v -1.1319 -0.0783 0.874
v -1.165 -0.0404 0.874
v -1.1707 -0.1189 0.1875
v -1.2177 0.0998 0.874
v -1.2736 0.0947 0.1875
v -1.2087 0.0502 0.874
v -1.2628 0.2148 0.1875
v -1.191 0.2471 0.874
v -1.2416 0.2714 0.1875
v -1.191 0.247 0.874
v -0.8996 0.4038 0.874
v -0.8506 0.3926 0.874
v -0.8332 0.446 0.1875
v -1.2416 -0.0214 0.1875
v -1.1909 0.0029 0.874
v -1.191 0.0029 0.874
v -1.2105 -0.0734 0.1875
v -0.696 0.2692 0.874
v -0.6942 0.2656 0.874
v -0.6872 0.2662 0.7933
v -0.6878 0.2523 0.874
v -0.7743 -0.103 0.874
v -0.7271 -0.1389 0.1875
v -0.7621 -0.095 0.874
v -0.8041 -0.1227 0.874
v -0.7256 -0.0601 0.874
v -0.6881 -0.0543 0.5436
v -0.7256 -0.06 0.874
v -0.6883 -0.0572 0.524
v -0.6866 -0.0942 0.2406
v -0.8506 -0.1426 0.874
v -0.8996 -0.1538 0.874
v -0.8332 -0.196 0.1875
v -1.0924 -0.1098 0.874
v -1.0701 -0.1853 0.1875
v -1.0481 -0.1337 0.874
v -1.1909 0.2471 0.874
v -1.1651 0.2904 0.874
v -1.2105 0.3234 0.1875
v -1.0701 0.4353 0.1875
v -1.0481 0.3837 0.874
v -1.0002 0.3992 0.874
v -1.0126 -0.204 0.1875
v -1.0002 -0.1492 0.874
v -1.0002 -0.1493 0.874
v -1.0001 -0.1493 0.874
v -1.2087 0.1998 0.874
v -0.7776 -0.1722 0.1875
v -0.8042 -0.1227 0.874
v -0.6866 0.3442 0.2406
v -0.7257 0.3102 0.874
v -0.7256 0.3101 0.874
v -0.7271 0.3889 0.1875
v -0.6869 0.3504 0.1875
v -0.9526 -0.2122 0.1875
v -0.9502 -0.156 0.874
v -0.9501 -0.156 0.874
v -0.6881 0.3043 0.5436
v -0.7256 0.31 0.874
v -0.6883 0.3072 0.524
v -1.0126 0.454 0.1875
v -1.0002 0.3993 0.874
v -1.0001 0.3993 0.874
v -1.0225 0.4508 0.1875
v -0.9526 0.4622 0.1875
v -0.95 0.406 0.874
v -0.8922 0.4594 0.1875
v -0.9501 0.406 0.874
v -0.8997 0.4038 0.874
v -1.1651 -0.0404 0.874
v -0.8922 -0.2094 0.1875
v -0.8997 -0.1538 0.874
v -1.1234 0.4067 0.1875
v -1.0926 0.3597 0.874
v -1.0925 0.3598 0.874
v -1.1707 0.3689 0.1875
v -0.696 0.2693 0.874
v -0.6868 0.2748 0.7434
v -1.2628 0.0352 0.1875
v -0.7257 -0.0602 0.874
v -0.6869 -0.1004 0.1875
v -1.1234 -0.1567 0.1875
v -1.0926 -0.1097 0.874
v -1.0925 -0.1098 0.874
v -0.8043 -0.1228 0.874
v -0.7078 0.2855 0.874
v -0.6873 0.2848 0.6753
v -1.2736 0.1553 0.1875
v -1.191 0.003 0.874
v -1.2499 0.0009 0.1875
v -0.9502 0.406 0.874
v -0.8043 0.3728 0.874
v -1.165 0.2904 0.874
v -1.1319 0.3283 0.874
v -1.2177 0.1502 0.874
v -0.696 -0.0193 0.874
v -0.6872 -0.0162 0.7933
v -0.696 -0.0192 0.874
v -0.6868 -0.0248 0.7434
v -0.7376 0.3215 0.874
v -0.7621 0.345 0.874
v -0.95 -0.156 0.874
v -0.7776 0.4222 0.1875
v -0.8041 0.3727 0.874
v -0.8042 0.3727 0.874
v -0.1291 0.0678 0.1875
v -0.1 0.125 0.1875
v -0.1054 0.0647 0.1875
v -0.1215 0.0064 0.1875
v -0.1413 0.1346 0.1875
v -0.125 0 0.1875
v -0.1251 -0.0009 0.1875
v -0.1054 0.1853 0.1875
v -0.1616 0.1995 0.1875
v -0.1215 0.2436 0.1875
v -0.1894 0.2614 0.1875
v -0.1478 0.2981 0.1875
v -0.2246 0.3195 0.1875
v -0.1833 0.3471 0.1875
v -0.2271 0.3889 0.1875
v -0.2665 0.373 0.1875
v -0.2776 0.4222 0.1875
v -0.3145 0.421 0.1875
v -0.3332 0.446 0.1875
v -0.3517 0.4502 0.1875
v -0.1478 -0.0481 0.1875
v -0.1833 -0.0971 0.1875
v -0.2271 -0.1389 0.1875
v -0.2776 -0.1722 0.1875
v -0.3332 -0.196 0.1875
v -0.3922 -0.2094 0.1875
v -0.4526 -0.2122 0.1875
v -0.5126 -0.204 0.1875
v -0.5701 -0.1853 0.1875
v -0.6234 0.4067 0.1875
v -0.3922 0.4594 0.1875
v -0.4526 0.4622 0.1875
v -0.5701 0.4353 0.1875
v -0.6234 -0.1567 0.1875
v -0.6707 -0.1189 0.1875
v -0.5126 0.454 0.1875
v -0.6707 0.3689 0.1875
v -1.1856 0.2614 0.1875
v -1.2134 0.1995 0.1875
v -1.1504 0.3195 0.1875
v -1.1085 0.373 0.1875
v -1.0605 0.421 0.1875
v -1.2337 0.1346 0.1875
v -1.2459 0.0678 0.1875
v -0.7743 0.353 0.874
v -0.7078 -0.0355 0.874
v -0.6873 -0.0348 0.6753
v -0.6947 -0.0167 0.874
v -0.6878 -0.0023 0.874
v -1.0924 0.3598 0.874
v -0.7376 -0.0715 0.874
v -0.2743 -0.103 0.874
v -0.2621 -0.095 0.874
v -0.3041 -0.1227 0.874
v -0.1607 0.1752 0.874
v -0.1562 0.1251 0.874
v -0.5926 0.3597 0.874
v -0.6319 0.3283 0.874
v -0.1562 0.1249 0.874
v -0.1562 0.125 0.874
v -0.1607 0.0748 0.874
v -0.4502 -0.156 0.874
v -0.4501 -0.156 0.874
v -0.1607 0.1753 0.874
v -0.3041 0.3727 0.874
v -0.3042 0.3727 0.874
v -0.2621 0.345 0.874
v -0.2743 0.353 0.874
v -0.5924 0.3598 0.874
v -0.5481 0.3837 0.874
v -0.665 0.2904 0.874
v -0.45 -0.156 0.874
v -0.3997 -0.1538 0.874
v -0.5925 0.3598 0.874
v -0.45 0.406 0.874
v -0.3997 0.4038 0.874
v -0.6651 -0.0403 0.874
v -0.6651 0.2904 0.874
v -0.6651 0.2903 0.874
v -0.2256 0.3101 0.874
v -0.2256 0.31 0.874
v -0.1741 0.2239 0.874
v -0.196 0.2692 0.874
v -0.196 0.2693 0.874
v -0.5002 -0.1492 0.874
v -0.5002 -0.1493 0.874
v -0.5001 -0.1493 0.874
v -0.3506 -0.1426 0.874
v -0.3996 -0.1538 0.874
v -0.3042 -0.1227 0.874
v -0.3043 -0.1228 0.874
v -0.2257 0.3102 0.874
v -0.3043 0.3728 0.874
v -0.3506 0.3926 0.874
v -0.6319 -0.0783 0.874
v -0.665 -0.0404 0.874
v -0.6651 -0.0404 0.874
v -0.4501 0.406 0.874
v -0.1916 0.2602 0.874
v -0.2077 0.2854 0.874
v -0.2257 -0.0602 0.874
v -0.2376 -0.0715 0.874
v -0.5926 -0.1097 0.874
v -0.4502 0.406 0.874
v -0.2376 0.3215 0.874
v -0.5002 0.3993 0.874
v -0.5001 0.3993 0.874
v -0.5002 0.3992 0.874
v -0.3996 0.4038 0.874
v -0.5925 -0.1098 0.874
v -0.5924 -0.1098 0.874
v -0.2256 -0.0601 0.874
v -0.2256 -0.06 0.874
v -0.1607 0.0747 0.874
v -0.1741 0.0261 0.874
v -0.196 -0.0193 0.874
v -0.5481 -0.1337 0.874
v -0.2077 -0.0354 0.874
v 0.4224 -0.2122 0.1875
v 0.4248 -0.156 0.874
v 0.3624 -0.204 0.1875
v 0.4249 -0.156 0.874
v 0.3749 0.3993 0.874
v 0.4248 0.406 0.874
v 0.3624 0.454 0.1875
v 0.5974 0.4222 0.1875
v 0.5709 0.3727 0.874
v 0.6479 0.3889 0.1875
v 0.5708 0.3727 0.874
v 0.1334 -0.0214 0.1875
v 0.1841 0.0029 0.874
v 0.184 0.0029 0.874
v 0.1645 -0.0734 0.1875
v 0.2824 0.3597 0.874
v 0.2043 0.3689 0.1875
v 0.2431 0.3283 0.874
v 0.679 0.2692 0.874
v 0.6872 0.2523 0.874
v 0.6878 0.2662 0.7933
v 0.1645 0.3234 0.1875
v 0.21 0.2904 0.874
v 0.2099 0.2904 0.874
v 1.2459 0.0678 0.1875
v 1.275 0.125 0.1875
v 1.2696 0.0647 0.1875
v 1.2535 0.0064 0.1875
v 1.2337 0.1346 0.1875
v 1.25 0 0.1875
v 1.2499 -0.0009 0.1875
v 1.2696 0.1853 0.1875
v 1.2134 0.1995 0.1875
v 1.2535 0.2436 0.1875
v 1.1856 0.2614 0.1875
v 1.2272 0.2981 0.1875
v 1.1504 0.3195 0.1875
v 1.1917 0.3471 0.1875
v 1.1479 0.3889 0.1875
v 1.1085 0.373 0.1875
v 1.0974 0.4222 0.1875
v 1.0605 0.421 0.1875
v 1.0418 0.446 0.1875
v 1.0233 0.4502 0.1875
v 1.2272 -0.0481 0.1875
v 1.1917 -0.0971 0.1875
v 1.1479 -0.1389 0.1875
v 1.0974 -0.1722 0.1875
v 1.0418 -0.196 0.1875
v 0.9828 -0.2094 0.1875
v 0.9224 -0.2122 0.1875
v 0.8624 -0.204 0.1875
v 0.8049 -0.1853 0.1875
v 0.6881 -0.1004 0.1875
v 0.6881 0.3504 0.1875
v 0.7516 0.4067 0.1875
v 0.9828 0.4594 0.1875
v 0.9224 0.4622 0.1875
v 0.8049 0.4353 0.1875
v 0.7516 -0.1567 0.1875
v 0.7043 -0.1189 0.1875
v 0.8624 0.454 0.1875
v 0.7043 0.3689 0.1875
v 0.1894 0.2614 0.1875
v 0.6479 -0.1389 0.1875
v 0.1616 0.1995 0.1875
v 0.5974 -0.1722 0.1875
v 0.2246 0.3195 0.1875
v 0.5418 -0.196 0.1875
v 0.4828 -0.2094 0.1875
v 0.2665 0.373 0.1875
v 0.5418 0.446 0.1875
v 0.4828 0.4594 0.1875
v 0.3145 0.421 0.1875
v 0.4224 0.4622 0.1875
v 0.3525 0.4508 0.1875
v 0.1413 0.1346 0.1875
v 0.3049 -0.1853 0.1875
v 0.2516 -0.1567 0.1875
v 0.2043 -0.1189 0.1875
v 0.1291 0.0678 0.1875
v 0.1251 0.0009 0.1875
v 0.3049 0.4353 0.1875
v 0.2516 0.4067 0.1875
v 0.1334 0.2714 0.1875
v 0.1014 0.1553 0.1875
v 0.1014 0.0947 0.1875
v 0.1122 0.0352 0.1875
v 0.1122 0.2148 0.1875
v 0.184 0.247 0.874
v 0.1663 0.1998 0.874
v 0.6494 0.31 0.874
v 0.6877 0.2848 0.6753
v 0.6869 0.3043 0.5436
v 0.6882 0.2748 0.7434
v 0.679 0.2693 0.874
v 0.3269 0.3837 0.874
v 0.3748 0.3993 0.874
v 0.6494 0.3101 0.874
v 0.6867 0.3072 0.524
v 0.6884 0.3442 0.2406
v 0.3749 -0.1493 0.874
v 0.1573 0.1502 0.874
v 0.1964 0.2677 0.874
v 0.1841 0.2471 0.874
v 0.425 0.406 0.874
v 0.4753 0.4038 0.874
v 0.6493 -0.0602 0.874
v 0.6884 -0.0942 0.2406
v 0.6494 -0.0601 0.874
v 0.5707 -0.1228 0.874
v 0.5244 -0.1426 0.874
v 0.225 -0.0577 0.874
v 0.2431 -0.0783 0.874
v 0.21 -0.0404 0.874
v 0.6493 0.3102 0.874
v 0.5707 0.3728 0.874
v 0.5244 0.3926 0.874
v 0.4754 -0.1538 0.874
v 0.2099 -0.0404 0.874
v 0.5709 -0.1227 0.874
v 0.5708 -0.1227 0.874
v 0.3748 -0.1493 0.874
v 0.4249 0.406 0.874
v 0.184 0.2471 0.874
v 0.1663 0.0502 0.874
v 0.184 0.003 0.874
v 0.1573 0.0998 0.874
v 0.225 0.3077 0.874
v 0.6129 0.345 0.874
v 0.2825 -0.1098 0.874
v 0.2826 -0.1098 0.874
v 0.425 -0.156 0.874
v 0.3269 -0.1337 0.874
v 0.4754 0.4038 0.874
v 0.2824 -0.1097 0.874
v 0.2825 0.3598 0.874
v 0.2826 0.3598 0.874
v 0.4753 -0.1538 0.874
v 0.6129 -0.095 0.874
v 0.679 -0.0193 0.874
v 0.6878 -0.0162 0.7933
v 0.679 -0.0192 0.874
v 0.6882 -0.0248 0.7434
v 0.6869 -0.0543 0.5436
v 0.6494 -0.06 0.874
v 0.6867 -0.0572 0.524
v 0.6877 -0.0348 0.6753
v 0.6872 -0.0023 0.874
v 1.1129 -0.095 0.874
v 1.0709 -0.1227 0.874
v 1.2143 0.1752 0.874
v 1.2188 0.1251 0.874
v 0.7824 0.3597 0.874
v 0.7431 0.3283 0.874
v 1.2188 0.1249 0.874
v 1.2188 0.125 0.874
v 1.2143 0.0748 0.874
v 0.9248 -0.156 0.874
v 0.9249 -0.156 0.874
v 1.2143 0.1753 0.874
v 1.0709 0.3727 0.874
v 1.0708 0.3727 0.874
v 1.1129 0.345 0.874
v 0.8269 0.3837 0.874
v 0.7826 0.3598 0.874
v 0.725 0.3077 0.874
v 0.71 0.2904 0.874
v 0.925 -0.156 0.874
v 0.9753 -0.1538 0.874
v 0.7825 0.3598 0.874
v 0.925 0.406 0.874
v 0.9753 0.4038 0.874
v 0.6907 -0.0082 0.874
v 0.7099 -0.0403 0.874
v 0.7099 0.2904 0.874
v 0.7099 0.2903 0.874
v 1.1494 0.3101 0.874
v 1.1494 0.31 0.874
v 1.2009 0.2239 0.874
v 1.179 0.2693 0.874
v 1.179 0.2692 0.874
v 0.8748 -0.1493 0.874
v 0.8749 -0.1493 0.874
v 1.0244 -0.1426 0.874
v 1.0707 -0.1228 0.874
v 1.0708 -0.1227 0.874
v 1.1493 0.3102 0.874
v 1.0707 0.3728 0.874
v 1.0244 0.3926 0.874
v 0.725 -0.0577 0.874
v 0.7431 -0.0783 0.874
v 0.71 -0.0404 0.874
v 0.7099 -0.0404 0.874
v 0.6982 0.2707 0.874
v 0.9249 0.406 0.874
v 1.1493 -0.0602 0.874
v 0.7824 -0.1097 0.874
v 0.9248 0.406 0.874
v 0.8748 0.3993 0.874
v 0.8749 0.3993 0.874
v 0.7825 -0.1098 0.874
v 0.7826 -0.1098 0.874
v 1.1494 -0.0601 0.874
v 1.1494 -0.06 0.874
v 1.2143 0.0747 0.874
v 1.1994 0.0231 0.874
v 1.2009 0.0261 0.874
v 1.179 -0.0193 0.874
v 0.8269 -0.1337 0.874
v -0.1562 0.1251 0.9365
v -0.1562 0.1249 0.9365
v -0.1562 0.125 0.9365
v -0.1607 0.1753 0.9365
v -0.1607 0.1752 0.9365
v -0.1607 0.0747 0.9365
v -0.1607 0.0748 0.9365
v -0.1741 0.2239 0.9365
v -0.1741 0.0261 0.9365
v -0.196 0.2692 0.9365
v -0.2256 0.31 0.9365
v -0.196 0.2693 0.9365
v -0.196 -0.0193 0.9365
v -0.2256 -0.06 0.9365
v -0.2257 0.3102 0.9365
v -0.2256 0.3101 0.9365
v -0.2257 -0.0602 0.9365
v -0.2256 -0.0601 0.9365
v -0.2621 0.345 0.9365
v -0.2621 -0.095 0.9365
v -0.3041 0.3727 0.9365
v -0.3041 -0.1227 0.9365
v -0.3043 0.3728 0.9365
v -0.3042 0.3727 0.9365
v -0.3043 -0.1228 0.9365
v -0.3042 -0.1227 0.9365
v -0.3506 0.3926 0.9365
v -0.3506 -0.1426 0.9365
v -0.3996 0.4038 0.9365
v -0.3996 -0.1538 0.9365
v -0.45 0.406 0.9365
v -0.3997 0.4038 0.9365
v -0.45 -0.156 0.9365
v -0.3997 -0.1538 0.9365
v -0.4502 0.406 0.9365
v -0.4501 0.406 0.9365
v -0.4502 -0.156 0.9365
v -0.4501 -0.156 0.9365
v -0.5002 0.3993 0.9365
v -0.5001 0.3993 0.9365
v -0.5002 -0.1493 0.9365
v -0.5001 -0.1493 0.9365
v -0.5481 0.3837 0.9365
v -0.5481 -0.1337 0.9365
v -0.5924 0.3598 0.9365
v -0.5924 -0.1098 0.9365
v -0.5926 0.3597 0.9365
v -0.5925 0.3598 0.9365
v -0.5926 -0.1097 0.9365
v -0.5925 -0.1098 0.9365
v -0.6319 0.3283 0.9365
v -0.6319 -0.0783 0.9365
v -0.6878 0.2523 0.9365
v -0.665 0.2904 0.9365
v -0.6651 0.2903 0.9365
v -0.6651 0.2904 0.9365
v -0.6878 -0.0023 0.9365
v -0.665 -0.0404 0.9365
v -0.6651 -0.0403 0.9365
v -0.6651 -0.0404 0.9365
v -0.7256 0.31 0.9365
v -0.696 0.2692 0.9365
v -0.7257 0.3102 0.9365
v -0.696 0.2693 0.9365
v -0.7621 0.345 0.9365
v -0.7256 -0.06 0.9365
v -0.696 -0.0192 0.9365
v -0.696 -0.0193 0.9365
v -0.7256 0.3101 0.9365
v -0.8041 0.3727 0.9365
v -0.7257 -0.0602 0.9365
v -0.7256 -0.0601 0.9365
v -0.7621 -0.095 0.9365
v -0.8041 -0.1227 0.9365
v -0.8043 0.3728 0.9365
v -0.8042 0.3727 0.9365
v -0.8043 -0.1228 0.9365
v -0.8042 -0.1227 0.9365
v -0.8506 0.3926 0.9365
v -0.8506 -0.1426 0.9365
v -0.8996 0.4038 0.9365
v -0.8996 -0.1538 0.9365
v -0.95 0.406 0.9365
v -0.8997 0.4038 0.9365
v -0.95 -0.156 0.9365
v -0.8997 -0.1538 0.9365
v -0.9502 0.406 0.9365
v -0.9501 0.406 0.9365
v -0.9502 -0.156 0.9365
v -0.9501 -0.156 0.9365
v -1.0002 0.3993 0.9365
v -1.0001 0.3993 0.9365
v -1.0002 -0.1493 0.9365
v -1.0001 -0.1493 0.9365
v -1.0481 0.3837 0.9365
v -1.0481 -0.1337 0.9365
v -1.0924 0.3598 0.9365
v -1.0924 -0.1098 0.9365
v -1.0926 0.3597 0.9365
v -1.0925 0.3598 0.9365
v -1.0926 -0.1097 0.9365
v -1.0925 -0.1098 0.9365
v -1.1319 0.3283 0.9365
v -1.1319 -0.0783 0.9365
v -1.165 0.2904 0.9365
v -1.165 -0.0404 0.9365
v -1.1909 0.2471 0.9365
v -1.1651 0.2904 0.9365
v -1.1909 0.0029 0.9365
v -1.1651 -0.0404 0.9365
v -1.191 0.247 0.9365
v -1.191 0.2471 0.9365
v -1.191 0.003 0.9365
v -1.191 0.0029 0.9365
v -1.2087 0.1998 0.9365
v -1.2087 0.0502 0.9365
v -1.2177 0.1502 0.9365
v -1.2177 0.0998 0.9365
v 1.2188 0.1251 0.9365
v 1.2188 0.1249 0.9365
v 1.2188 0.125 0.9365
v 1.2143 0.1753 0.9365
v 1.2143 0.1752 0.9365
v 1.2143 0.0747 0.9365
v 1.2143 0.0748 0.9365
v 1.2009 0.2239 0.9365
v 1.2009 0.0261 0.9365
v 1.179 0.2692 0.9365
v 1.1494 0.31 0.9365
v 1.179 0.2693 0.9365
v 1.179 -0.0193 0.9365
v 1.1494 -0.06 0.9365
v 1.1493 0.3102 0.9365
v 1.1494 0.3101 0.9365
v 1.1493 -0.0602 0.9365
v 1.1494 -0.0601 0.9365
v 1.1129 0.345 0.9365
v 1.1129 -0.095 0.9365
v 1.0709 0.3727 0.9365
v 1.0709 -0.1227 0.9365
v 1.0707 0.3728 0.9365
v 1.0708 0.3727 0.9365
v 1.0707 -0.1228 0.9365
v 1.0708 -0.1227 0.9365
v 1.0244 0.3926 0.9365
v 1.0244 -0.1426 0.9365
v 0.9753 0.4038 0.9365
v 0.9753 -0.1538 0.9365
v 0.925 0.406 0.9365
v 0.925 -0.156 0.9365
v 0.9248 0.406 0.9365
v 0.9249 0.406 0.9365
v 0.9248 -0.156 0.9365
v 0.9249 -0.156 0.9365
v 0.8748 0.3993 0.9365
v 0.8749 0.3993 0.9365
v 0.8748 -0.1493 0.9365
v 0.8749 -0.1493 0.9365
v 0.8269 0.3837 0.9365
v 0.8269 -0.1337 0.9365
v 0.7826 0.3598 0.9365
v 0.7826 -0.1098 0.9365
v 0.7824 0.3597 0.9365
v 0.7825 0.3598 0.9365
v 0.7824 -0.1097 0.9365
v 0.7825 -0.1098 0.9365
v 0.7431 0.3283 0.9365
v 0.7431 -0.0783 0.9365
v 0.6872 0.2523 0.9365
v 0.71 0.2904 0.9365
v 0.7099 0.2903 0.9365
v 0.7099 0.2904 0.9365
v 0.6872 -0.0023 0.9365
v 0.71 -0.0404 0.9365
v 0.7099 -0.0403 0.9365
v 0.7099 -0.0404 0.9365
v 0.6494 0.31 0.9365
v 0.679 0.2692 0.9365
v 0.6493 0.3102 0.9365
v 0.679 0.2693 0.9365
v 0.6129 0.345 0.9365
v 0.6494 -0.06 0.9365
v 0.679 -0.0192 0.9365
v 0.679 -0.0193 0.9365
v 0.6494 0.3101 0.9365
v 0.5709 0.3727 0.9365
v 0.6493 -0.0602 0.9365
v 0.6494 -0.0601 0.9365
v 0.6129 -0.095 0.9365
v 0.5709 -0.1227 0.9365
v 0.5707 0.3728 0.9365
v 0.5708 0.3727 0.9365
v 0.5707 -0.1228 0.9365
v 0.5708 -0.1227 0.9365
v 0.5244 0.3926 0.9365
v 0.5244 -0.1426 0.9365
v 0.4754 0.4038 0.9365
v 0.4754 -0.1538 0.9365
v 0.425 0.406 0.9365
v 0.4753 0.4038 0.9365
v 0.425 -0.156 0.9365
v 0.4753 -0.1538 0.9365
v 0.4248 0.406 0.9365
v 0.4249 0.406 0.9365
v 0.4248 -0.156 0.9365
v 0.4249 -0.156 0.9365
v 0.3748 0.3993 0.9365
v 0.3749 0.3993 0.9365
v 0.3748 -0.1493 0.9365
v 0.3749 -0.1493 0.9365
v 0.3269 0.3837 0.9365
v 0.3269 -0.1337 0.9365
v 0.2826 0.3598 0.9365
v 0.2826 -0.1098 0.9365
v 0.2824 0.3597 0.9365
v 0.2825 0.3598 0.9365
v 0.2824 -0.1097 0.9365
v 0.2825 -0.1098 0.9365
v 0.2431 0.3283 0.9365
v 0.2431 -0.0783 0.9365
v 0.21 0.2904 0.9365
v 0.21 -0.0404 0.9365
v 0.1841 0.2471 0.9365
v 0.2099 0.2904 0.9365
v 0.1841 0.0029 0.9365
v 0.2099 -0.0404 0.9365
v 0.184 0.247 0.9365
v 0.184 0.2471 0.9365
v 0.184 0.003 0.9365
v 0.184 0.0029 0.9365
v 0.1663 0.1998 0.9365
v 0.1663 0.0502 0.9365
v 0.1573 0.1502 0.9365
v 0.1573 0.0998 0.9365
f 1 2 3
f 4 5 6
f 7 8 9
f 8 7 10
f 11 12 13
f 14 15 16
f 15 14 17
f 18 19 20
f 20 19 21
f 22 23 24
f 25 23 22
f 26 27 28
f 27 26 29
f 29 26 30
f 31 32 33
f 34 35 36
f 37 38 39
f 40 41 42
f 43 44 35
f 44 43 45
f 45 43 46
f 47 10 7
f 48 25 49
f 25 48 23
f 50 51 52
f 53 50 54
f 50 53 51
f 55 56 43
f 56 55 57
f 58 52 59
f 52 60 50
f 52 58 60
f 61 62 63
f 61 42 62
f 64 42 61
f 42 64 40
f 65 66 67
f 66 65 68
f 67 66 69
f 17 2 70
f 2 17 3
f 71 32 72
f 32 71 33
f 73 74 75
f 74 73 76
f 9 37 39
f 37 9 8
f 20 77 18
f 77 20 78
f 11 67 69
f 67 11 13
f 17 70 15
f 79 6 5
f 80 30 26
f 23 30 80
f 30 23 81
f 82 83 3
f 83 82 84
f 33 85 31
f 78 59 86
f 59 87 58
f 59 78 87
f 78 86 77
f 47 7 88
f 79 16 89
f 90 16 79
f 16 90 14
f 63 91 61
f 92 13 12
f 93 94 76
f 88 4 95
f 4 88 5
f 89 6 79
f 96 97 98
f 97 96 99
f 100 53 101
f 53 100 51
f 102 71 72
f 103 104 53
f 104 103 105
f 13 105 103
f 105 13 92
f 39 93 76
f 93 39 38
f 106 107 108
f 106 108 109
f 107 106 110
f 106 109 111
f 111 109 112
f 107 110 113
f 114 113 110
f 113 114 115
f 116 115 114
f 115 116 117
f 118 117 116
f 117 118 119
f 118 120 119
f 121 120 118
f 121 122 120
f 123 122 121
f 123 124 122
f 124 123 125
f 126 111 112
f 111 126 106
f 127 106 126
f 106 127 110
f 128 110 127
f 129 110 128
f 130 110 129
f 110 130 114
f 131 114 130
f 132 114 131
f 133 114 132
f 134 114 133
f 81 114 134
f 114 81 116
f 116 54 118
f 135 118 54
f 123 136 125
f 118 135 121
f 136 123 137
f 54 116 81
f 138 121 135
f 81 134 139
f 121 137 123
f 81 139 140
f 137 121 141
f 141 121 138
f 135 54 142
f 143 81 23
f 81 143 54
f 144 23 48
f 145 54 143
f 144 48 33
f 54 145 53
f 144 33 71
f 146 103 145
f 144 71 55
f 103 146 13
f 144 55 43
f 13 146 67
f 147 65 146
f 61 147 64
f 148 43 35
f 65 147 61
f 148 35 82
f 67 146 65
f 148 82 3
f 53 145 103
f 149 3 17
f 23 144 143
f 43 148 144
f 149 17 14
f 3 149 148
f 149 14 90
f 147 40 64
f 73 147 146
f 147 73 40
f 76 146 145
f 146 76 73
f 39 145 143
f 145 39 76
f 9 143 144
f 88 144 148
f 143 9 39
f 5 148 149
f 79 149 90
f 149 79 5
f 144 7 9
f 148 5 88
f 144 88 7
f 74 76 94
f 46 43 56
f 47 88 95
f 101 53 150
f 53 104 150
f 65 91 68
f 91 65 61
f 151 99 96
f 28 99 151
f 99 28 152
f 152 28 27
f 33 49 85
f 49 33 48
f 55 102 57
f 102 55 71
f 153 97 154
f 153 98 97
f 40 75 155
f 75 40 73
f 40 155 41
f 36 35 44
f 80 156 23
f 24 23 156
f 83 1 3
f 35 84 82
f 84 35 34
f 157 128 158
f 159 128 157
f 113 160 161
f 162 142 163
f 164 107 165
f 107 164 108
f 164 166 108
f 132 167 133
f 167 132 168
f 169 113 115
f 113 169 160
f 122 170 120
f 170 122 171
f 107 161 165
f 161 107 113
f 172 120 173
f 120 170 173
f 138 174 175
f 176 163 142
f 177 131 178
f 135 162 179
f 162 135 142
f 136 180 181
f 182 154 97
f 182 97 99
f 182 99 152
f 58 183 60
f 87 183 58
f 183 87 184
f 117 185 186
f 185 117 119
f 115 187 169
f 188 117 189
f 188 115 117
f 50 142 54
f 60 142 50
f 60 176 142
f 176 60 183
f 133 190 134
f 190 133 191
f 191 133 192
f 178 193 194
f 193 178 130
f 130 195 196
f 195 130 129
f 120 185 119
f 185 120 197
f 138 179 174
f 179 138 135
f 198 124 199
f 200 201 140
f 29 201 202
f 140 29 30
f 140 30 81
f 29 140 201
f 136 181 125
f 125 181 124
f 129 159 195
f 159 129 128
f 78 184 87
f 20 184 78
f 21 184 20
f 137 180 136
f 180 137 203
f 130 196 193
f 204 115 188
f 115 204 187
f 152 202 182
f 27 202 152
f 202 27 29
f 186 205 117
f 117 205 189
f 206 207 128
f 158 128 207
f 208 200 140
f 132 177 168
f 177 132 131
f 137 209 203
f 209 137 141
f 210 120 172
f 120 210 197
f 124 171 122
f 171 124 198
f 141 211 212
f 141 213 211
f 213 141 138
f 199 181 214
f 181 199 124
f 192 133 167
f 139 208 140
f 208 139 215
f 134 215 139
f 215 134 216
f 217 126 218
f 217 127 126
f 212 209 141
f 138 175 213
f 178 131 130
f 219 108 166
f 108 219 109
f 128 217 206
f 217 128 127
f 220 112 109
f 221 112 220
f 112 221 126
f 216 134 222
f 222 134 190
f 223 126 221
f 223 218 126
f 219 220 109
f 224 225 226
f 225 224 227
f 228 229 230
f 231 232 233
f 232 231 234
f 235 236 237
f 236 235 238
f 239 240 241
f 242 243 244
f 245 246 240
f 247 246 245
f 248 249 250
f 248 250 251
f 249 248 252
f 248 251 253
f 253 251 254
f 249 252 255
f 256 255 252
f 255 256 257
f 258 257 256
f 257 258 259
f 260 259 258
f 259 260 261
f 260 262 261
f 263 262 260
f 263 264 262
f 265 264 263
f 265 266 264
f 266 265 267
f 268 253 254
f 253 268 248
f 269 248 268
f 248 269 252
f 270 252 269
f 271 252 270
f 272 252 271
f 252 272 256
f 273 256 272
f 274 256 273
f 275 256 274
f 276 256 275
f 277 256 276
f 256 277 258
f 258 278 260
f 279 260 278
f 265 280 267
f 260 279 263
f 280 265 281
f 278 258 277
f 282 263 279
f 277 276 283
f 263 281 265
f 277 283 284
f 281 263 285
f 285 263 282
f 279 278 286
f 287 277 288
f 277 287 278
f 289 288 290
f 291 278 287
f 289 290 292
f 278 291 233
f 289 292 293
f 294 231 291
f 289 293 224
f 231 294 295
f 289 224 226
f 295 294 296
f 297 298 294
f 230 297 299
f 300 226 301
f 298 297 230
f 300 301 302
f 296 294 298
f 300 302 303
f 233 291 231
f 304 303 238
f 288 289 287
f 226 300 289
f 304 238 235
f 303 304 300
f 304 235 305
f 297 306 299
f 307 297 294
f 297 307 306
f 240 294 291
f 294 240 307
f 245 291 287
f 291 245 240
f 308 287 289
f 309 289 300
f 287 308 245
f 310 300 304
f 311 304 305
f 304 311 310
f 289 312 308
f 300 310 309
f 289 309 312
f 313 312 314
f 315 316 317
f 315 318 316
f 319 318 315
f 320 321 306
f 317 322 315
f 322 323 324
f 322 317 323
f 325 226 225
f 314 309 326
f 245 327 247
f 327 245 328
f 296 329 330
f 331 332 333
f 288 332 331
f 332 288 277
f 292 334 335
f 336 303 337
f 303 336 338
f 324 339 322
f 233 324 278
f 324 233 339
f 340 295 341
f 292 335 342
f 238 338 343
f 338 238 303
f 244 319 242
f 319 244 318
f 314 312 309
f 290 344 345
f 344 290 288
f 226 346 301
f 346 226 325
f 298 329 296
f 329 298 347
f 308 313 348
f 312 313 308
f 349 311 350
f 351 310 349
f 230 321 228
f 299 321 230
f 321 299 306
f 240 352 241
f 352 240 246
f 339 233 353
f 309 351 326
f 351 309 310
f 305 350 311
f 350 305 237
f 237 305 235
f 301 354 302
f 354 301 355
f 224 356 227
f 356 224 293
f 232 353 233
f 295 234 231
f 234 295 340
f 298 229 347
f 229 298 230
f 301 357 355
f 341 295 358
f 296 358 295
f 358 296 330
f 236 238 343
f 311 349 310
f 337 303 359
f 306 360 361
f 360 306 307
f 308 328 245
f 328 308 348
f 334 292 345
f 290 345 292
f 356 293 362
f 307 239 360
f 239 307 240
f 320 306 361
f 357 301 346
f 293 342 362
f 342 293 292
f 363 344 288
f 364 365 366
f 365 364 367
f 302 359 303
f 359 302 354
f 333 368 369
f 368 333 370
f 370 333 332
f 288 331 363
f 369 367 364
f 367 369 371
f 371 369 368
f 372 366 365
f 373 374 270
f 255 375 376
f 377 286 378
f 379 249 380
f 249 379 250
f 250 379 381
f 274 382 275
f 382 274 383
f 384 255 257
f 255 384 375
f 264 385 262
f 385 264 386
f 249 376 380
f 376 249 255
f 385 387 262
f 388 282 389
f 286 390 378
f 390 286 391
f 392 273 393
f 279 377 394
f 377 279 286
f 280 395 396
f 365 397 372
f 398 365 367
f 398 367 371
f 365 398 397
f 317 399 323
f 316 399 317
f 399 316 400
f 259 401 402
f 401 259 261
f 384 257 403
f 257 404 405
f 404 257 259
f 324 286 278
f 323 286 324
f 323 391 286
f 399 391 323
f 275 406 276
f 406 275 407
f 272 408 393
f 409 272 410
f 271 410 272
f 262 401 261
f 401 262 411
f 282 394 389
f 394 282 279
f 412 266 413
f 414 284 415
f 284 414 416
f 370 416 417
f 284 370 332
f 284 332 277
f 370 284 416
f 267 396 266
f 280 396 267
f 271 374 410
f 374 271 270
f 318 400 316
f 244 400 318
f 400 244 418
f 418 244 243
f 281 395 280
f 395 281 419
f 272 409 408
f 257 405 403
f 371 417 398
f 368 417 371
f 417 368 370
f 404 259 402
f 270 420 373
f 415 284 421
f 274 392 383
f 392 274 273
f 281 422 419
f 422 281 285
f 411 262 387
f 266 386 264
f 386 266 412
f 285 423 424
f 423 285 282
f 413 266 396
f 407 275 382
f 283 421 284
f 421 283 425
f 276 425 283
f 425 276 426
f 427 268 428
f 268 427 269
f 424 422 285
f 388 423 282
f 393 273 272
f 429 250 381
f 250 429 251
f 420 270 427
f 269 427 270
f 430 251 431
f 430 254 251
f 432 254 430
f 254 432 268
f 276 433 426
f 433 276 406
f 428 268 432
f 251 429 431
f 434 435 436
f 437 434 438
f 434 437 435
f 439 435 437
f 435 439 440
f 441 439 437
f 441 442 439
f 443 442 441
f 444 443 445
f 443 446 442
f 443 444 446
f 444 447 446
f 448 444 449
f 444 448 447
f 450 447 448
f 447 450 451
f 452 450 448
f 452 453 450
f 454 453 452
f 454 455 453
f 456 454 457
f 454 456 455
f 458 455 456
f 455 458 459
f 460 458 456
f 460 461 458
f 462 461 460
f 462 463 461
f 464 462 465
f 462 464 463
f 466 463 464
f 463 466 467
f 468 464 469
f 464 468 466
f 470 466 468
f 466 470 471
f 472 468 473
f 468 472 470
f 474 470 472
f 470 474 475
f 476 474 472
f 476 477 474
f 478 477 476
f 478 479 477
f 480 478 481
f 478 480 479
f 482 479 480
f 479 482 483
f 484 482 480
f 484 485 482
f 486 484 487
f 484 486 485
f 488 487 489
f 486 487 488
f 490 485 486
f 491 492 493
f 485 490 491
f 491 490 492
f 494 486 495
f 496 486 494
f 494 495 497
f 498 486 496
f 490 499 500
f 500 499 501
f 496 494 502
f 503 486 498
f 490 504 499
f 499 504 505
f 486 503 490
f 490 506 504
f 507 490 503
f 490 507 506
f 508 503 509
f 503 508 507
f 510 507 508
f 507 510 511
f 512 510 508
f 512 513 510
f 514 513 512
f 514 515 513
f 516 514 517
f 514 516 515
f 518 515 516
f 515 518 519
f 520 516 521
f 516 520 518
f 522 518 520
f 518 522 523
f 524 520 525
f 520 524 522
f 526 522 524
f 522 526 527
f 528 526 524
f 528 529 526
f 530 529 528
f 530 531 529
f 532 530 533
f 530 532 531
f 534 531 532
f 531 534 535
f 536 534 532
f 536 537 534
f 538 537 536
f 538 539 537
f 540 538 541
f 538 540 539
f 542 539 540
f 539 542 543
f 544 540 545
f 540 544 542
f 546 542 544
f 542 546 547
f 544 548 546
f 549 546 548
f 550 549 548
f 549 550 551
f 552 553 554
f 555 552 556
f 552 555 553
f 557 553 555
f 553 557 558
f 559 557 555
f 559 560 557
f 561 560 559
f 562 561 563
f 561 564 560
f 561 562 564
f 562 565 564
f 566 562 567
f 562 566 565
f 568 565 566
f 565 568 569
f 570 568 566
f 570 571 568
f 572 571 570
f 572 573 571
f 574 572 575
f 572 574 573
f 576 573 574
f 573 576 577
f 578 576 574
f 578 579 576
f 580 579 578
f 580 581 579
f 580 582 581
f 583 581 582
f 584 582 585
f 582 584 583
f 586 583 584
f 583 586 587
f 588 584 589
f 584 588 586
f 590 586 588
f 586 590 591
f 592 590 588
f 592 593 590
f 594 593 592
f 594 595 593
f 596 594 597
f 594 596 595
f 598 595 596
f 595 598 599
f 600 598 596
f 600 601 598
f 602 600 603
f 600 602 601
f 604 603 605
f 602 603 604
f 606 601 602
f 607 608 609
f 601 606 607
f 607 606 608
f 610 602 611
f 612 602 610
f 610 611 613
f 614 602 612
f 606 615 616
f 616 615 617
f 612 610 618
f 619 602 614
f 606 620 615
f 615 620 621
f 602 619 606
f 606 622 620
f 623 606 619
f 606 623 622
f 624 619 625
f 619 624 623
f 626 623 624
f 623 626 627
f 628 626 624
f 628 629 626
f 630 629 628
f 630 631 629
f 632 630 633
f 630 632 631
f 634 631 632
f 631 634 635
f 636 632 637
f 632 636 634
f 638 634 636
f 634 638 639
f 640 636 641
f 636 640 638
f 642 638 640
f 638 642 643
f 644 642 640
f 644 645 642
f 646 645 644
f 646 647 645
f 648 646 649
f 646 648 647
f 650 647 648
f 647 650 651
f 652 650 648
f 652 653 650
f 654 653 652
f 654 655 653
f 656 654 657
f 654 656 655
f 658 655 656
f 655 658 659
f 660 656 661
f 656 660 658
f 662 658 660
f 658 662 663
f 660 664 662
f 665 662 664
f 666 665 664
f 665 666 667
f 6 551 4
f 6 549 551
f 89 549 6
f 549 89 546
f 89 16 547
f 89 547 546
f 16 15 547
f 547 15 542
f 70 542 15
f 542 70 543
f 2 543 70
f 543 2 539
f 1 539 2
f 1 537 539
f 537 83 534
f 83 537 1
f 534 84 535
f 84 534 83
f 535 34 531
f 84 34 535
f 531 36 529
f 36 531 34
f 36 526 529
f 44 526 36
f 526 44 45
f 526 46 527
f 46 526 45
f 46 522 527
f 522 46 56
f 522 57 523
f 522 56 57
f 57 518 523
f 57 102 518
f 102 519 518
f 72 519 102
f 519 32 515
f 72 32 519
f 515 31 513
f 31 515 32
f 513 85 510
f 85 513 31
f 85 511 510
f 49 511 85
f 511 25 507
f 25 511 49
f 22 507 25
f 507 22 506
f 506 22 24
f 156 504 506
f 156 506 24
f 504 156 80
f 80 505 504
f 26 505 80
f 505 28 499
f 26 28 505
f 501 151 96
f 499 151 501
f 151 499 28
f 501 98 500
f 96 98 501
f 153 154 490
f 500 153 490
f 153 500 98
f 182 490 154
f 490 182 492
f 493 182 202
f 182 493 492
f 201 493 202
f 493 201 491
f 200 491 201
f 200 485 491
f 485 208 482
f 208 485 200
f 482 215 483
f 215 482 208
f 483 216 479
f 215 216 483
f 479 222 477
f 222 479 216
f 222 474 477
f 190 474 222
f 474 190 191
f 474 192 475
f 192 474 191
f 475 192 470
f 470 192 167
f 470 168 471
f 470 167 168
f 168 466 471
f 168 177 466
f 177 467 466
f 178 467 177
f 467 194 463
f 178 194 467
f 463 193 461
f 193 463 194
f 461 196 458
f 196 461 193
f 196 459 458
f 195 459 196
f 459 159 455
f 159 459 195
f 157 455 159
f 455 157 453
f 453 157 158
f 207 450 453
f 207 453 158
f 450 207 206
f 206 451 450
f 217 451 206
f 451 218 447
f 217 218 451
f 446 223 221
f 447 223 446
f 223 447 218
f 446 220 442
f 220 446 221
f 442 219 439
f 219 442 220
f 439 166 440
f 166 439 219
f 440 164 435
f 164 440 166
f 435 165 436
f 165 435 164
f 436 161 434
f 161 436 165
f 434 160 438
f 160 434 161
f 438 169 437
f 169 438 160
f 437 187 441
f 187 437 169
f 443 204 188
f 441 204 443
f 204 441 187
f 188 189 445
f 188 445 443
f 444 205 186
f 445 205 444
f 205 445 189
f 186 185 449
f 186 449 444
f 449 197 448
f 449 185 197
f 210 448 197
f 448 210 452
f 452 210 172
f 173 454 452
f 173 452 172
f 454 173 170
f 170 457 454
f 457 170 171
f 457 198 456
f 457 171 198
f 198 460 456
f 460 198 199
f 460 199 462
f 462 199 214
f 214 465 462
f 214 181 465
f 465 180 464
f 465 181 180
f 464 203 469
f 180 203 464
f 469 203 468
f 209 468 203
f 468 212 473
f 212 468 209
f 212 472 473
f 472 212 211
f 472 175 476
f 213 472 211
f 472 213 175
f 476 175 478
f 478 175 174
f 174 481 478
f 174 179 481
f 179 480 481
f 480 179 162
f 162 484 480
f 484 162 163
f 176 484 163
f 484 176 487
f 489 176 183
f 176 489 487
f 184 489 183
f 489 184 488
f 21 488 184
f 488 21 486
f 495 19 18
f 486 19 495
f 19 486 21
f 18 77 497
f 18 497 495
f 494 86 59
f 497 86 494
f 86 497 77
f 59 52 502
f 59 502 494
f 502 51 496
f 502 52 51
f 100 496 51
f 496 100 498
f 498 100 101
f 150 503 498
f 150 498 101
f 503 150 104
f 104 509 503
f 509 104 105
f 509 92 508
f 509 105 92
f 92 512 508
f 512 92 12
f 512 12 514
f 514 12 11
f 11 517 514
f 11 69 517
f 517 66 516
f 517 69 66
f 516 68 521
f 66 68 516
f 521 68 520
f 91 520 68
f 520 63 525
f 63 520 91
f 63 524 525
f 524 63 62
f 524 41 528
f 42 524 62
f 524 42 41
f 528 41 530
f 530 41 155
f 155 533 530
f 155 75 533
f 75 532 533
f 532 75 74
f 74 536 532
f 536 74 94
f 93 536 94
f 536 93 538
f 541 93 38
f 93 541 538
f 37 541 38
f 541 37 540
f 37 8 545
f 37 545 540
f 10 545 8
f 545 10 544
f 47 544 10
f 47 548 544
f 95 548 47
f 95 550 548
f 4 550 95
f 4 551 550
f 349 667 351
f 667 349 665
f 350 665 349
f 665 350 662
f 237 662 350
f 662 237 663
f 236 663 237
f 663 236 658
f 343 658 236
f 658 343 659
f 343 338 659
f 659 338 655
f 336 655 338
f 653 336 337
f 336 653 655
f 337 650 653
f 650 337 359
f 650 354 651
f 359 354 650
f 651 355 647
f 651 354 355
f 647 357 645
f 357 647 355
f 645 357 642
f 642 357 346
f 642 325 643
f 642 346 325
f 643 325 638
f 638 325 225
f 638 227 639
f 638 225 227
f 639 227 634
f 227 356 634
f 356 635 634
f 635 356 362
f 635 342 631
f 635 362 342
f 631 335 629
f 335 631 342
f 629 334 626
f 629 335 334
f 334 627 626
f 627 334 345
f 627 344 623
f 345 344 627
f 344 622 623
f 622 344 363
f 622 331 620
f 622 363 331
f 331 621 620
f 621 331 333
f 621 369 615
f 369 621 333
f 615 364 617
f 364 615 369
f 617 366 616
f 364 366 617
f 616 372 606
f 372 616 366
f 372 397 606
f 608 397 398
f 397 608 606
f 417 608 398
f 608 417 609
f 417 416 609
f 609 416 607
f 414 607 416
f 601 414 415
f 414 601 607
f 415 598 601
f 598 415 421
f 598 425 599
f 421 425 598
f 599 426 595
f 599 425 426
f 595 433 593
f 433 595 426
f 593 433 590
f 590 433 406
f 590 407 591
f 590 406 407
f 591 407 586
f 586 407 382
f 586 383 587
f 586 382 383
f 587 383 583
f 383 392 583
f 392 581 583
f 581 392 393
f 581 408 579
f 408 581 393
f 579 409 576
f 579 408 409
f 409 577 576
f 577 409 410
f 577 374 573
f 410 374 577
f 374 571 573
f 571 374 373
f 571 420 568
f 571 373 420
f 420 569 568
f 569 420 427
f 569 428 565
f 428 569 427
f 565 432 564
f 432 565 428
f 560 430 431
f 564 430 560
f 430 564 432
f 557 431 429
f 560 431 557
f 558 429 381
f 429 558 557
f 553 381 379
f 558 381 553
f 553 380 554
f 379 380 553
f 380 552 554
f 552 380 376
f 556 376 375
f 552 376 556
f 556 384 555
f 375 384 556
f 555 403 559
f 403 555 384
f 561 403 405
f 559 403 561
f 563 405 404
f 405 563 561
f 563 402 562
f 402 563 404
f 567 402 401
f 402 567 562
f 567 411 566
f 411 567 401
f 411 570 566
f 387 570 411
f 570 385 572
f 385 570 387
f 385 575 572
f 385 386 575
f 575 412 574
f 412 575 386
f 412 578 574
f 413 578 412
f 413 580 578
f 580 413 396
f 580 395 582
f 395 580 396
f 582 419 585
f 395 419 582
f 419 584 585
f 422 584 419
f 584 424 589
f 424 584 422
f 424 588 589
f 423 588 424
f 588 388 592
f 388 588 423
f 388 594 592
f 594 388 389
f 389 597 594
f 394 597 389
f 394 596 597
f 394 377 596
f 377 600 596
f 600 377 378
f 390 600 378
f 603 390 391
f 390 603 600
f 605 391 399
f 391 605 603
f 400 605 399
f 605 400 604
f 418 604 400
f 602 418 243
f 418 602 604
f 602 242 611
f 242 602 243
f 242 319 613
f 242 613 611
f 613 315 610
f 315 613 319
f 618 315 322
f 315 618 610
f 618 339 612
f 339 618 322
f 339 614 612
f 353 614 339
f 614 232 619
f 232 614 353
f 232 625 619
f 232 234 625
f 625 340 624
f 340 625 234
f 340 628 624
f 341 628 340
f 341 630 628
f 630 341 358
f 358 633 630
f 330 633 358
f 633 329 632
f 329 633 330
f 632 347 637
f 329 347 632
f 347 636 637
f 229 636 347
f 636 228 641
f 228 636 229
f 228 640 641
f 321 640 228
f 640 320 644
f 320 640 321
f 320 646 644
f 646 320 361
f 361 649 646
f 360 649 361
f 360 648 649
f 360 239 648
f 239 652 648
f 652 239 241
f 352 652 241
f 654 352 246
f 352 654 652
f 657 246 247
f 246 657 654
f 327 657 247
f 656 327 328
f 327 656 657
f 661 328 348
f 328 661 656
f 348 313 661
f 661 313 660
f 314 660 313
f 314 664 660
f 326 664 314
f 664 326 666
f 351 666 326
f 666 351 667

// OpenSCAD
//------------------------------------------------------------------
/*

Wallaby Cylinder Head

No draft version intended for 3d printing and investment casting.

*/
//------------------------------------------------------------------
// scaling

// note: STL is unit-less, so I'm leaving all measurements as plan
// and handling the scaling on the print side.

_desired_scale = 1.25;
_al_shrink = 0.98;
_scale = _desired_scale / _al_shrink;

// set casting to true to generate the casting pattern
casting = true;

//------------------------------------------------------------------
// tweak a height to avoid rendering issues when diff-ed surfaces
// align with each other.

tweak = 0.001;

//------------------------------------------------------------------
// control the number of facets on cylinders

_accuracy = 0.001;
function fn(r) = 180 / acos(1 - (_accuracy / r));

//------------------------------------------------------------------
// cylinder domes - or full base

cylinder_h = 3/16;
cylinder_d = 1 + (1/8);
cylinder_wall = 1/4;
cylinder_r = cylinder_d / 2;

dome_r = cylinder_wall + cylinder_r;
dome_h = cylinder_wall + cylinder_h;
dome_draft = [1.04,1.04];

c2c_d = (1 + (3/8));

// cylinder domes - the metal
module cylinder_dome(d) {
  translate([d,0,dome_h]) {
    rotate([0,180,0]) {
      linear_extrude(height = dome_h, scale = dome_draft)
      circle(r = dome_r, $fn = fn(dome_r));
    }
  }
}

module cylinder_domes() {
  cylinder_dome(-c2c_d/2);
  cylinder_dome(c2c_d/2);
}

// full cylinder head base
module head_base() {
  translate([0,0,0]) {
    linear_extrude(height = dome_h)
    import(file = "head_cover.dxf", layer = "head_wall_outer", $fn = fn(0.25));
  }
}

//------------------------------------------------------------------
// cylinder heads - the empty space

head_tweak = 1;

module cylinder_head(d) {
  translate([d,0,-head_tweak]) {
    cylinder(h = cylinder_h + head_tweak, r = cylinder_r, $fn = fn(cylinder_r));
  }
}

module cylinder_heads() {
  cylinder_head(-c2c_d / 2.0);
  cylinder_head(c2c_d / 2.0);
}

//------------------------------------------------------------------
// cylinder head wall

head_w = 1 + (3/4);
head_h = (7/8);
head_l = 3.382;

eb_h = head_l + (3/16);
eb_z_ofs = (1/2);

module head_outer() {
  // wall
  translate([0,0,head_h]) {
    rotate([0,180,0]) {
      linear_extrude(height = head_h)
      import(file = "head_cover.dxf", layer = "head_wall_outer", $fn = fn(0.25));
    }
  }
  // exhaust bosses
  translate([-eb_h/2,0,eb_z_ofs]) {
    rotate([0,90,0]) {
      linear_extrude(height = eb_h)
      import(file = "head_cover.dxf", layer = "exhaust_boss", $fn = fn(1/4));
    }
  }
}

module head_inner() {
  translate([0,0,head_h + tweak/2]) {
    rotate([0,180,0]) {
      linear_extrude(height = head_h + tweak)
      import(file = "head_cover.dxf", layer = "head_wall_inner", $fn = fn(1/4));
    }
  }
}

module head_stud_holes() {
  translate([0,0,-tweak/2]) {
    linear_extrude(height = head_h + tweak)
    import(file = "head_cover.dxf", layer = "head_wall_holes", $fn = fn(1/4));
  }
}

module head_walls()
{
  difference() {
    head_outer();
    head_inner();
  }
}

//------------------------------------------------------------------
// valve bosses

valve_d = 1/4;
valve_r = valve_d/2;
valve_y_ofs = 1/8;
valve_wall = 5/32;
v2v_d = 1/2;
valve_draft = [1.2,1.2];

module valve(d) {
  translate([d,valve_y_ofs,head_h]) {
    rotate([180,0,0]) {
      linear_extrude(height = head_h - cylinder_h, scale = valve_draft)
      circle(r = valve_r + valve_wall, $fn = fn(1/4));
    }
  }
}

module valve_set(d) {
  translate([d,0,0]) {
    valve(-v2v_d/2);
    valve(v2v_d/2);
  }
}

module valve_sets() {
    valve_set(-c2c_d/2);
    valve_set(c2c_d/2);
}

module valve_holes() {
  translate([0,0,-tweak/2]) {
    linear_extrude(height = head_h + tweak)
    import(file = "head_cover.dxf", layer = "valve_holes", $fn = fn(1/8));
  }
}

//------------------------------------------------------------------
// spark plug bosses

sp_hole_d = 21/64;
sp_hole_r = sp_hole_d/2;
sp2sp_d = 1 + (5/8);
sp_hole_h = 3;
sp_theta = 30;
sp_gap = (head_w/2) - ((7/16)/tan(sp_theta));
sp_base = ((7/16)/tan(sp_theta)) - ((5/16)*sin(sp_theta));
sp_y_ofs = -(sp_gap + sp_base);
sp_z_ofs = (sp_base * tan(sp_theta));

module sp_boss(d) {
  translate([d,sp_y_ofs,sp_z_ofs]) {
    rotate([90-sp_theta,0,0]) {
      rotate_extrude($fn = 64)
      import(file = "sparkplug.dxf", layer = "outer");
    }
  }
}

module sp_bosses() {
  intersection() {
    head_outer();
    union() {
      sp_boss(-sp2sp_d/2);
      sp_boss(sp2sp_d/2);
    }
  }
}

module sp_hole(d) {
  translate([d,sp_y_ofs,sp_z_ofs]) {
    rotate([90-sp_theta,0,0]) {
      rotate_extrude($fn = 64)
      import(file = "sparkplug.dxf", layer = "inner");
    }
  }
}

module sp_holes() {
  sp_hole(-sp2sp_d/2);
  sp_hole(sp2sp_d/2);
}

module sp_countersink(d) {
  translate([d,sp_y_ofs,sp_z_ofs]) {
    rotate([90-sp_theta,0,0]) {
      rotate_extrude($fn = 64)
      import(file = "sparkplug.dxf", layer = "countersink");
    }
  }
}

module sp_countersinks() {
  sp_countersink(-sp2sp_d/2);
  sp_countersink(sp2sp_d/2);
}

//------------------------------------------------------------------

manifold_r = 5/16;
manifold_hole_r = 1/8;
inlet_theta = 30.2564;
exhaust_theta = 270 + 13.9736;
exhaust_x_ofs = (c2c_d/2) + (v2v_d/2);
inlet_x_ofs = (c2c_d/2) - (v2v_d/2);

module manifold_set(r) {
  translate([exhaust_x_ofs,valve_y_ofs,eb_z_ofs]) {
    rotate([-90,0,exhaust_theta]) {
      cylinder(h=2,r=r, $fn = fn(r));
    }
  }
  translate([inlet_x_ofs,valve_y_ofs,eb_z_ofs]) {
    rotate([-90,0,inlet_theta]) {
      cylinder(h=2,r=r, $fn = fn(r));
    }
  }
}

module manifold_x() {
  manifold_set(manifold_r);
  mirror([1,0,0]) {
    manifold_set(manifold_r);
  }
}

module manifolds() {
  intersection() {
    manifold_x();
    head_outer();
  }
}

module manifold_holes() {
  manifold_set(manifold_hole_r);
  mirror([1,0,0]) {
    manifold_set(manifold_hole_r);
  }
}

//------------------------------------------------------------------

module additive() {
  head_walls();
  head_base();
  //cylinder_domes();
  sp_bosses();
  valve_sets();
  manifolds();
}

module subtractive() {
  if (casting) {
    cylinder_heads();
    sp_countersinks();
  } else {
    head_stud_holes();
    cylinder_heads();
    valve_holes();
    sp_holes();
    manifold_holes();
  }
}

module base_model() {
  difference() {
    additive();
    subtractive();
  }
}

//------------------------------------------------------------------
// Add machining allowances to top and bottom surfaces

allowance_width = (1/16);

module allowances() {
  color("Red", 0.5) {
    // bottom surface
    translate([0,0,-allowance_width + tweak]) {
      linear_extrude(height = allowance_width) projection(cut = true)
      translate ([0,0,-tweak]) base_model();
    }
    // top surface
    translate([0,0,head_h - tweak]) {
      linear_extrude(height = allowance_width) projection(cut = true)
      translate ([0,0,-head_h + tweak]) base_model();
    }
  }
}

//------------------------------------------------------------------

module model() {
  base_model();
  if (casting) {
    allowances();
  }
}

//------------------------------------------------------------------

model();
